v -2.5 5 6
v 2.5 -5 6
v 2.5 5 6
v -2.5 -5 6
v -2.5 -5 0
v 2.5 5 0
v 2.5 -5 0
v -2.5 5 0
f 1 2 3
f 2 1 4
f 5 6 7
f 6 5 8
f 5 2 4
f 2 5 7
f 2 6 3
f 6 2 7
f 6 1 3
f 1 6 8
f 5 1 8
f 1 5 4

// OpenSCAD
// brick 1x2

// external vars #########################

ext_scale = 1.0;
ext_fn = 12;

// part ##################################

module brick_1x2(m_scale=ext_scale,m_fn=ext_fn) {
    scale([m_scale,m_scale,m_scale])
    translate([-2.5,-5,0])
    cube([5,10,6],center=false);
}

brick_1x2();
